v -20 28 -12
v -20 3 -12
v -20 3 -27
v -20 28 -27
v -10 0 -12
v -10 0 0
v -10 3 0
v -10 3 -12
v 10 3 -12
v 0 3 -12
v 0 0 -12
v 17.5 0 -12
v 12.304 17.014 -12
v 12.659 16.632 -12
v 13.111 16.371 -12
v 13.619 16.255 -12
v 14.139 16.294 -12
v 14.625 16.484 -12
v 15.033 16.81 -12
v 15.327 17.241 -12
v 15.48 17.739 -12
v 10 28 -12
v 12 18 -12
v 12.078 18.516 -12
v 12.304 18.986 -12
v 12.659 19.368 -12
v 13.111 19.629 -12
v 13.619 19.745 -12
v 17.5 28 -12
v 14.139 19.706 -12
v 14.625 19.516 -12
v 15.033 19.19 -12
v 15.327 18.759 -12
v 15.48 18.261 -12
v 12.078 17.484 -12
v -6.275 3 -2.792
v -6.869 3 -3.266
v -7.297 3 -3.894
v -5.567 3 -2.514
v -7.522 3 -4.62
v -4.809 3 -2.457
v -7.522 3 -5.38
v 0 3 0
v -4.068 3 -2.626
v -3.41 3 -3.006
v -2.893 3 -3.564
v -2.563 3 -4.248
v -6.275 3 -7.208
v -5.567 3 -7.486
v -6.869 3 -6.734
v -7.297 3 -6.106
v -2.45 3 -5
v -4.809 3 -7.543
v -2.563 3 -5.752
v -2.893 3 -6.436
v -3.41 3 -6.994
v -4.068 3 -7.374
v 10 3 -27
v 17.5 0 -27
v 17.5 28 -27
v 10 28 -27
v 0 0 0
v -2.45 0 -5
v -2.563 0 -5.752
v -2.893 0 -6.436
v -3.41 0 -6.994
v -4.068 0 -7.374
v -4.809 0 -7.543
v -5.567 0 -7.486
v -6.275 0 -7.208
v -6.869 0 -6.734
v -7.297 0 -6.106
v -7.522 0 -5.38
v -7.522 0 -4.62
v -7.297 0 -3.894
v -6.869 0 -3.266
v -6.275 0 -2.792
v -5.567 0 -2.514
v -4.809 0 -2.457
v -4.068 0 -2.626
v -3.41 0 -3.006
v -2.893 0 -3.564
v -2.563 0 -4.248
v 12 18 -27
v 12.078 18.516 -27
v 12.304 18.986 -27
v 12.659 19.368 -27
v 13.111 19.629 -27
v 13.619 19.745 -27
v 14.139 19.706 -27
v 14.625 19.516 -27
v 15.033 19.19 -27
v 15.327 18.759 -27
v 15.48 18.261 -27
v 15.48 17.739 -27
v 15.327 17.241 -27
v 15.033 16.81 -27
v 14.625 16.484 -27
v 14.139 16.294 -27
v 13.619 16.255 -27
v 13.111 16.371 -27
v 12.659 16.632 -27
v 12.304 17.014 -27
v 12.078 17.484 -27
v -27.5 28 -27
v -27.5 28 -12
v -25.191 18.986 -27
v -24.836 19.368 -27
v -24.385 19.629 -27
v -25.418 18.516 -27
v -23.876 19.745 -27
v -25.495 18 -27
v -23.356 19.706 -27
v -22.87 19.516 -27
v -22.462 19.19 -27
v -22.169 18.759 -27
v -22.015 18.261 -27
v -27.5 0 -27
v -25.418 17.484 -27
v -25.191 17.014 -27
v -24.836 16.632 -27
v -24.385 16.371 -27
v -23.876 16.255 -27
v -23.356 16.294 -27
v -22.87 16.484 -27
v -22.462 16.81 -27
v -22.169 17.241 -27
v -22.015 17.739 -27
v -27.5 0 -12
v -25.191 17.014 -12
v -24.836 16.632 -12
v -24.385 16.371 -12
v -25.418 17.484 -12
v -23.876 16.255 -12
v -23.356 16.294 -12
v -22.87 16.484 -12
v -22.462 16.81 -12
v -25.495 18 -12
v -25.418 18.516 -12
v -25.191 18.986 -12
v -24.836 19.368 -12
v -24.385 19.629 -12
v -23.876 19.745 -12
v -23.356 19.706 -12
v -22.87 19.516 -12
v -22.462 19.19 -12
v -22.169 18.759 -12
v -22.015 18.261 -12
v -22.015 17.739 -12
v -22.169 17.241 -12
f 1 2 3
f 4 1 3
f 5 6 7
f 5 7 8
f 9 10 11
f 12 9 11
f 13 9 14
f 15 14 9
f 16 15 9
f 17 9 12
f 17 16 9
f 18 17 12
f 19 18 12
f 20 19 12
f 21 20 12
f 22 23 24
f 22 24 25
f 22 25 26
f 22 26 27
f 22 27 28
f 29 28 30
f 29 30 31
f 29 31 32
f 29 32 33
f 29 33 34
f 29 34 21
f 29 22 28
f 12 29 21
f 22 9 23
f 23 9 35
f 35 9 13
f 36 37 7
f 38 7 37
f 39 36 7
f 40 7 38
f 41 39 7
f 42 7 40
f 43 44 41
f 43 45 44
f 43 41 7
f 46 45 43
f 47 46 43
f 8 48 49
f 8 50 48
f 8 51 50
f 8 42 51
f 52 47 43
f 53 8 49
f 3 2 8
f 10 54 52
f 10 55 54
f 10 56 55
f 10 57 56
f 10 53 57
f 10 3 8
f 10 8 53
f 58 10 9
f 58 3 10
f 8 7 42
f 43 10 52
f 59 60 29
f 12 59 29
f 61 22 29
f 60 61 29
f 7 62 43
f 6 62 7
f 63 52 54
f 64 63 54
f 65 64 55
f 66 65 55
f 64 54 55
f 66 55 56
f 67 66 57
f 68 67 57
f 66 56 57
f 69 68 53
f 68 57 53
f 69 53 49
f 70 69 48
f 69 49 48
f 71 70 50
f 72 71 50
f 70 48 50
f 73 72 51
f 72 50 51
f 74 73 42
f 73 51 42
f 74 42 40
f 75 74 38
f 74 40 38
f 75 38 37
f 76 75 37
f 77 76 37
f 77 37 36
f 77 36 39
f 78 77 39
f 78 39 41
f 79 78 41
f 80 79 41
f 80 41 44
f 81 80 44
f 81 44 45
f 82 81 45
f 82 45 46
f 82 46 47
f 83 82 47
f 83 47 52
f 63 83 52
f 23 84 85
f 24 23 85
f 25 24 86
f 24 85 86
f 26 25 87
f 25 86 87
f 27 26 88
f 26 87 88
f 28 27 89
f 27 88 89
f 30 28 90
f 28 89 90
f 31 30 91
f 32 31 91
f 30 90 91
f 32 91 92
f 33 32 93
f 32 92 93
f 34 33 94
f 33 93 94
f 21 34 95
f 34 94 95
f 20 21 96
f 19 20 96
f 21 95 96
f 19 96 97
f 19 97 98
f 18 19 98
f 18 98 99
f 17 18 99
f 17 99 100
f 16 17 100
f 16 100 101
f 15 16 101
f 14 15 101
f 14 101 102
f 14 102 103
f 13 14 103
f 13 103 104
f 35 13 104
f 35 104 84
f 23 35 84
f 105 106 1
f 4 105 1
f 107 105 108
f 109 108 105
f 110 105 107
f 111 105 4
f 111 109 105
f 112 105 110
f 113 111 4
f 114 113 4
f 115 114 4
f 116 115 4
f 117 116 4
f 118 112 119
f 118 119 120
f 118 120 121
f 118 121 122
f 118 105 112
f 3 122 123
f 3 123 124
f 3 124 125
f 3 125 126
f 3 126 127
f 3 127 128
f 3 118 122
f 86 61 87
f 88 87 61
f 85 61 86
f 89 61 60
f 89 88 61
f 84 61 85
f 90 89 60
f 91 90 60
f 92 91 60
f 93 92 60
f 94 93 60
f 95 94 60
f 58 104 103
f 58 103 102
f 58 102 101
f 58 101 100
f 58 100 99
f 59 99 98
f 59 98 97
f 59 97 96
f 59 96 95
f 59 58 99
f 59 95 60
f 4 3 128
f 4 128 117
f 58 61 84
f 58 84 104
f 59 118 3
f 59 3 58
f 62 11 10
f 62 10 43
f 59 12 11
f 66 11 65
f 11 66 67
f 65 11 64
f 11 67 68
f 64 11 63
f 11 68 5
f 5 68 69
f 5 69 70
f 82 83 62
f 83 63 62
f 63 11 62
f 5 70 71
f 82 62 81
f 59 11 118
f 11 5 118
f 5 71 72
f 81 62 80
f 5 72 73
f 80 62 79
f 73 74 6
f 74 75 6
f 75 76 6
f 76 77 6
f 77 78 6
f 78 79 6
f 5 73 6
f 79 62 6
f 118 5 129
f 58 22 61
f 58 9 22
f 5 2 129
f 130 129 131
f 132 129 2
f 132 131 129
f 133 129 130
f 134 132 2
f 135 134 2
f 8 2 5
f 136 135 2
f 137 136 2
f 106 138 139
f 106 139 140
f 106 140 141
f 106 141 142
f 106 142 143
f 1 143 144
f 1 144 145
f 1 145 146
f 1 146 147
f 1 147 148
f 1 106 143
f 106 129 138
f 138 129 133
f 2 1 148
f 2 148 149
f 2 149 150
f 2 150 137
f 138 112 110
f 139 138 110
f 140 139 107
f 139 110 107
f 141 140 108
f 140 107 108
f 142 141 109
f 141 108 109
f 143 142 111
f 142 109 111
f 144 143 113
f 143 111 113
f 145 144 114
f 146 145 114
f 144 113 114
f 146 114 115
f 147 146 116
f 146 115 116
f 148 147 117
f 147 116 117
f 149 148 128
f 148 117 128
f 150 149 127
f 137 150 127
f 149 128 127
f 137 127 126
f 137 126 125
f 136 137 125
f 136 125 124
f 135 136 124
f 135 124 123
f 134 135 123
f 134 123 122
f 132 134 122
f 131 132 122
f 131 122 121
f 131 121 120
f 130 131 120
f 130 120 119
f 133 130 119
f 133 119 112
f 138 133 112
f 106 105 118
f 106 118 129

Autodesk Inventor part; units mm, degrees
ref_plane "YZ Plane" through (0, 0, 0) normal (1, 0, 0) x (0, 1, 0)
ref_plane "XZ Plane" through (0, 0, 0) normal (0, 1, 0) x (-1, 0, 0)
ref_plane "XY Plane" through (0, 0, 0) normal (0, 0, 1) x (1, 0, 0)
sketch "Sketch1" plane through (0, 0, 0) normal (0, 1, 0) x (-1, 0, 0)
  line L0 (0, 0) -> (10, 0)
  line L1 (10, 0) -> (10, -27)
  line L2 (10, -27) -> (0, -27)
  line L3 (0, -27) -> (0, 0)
  dimension "d0" = 10
  dimension "d1" = 27
extrude "Extrusion1" add sketch "Sketch1" along normal blind 10
sketch "Sketch2" plane through (0, 10, 0) normal (0, 1, 0) x (1, 0, 0)
  line L0 (-10, 27) -> (-10, 0) projected
  line L1 (-10, 0) -> (-10, 5)
  circle A0 centre (-5, 5) radius 2.55
  point P0 (0, 0)
  dimension "d4" = 5
  dimension "d5" = 5.1
extrude "Extrusion2" cut sketch "Sketch2" against normal blind 10
sketch "Sketch4" plane through (0, 10, 0) normal (0, 1, 0) x (1, 0, 0)
  line L0 (0, 27) -> (-10, 27) projected
  line L1 (-10, 27) -> (-10, 0) projected
  line L2 (0, 27) -> (-10, 27)
  line L3 (-10, 27) -> (-10, 0)
  line L4 (-10, 0) -> (0, 0)
  line L5 (0, 0) -> (0, 27)
  point P0 (0, 0)
  dimension "d13" = 27
extrude "Extrusion4" cut sketch "Sketch4" against normal blind 7
sketch "Sketch5" plane through (0, 3, 0) normal (0, 1, 0) x (1, 0, 0)
  line L0 (-10, 27) -> (0, 27) projected
  line L1 (-5, 27) -> (17.5, 27)
  line L2 (17.5, 27) -> (17.5, 12)
  line L3 (17.5, 12) -> (-5, 12)
  line L4 (-5, 12) -> (-5, 27)
  line L5 (-5, 27) -> (-27.5, 27)
  line L6 (-27.5, 27) -> (-27.5, 12)
  line L7 (-27.5, 12) -> (-5, 12)
  line L8 (-5, 12) -> (-5, 27)
  point P0 (0, 0)
  dimension "d16" = 22.5
  dimension "d17" = 15
  dimension "d18" = 22.5
extrude "Extrusion5" add sketch "Sketch5" against normal blind 3
sketch "Sketch6" plane through (0, 3, 0) normal (0, 1, 0) x (1, 0, 0)
  line L0 (17.5, 12) -> (-27.5, 12) projected
  line L1 (-5, 12) -> (10, 12)
  line L2 (10, 12) -> (10, 27)
  line L3 (-27.5, 27) -> (17.5, 27) projected
  line L4 (-5, 12) -> (-20, 12)
  line L5 (-27.5, 12) -> (-10, 12) projected
  line L6 (-20, 12) -> (-20, 27)
  line L7 (-20, 12) -> (-27.5, 12)
  line L8 (-27.5, 12) -> (-27.5, 27)
  line L9 (-27.5, 27) -> (-20, 27)
  line L10 (-20, 27) -> (-20, 12)
  line L11 (10, 12) -> (17.5, 12)
  line L12 (17.5, 12) -> (17.5, 27)
  line L13 (17.5, 27) -> (10, 27)
  line L14 (10, 27) -> (10, 12)
  point P0 (0, 0)
  dimension "d21" = 15
  dimension "d22" = 15
extrude "Extrusion6" add sketch "Sketch6" along normal blind 25 contours L0 L2 L3 L12 | L6 L0 L8 L3
sketch "Sketch7" plane through (17.5, 0, -27) normal (0, 0, -1) x (-1, 0, 0)
  line L0 (37.5, 3) -> (7.5, 3) projected
  line L1 (7.5, 3) -> (0, 3)
  line L2 (0, 0) -> (0, 28) projected
  line L3 (3.75, 3) -> (3.75, 18)
  line L4 (37.5, 3) -> (44.9906, 3)
  line L5 (41.2453, 3) -> (41.2453, 18)
  circle A0 centre (3.75, 18) radius 1.75
  circle A1 centre (41.2453, 18) radius 1.75
  point P0 (17.5, 0)
  dimension "d25" = 15
  dimension "d26" = 15
  dimension "d27" = 3.5
  dimension "d28" = 3.5
extrude "Extrusion7" cut sketch "Sketch7" against normal blind 25
properties part number "Raket_Arme_Motor"
